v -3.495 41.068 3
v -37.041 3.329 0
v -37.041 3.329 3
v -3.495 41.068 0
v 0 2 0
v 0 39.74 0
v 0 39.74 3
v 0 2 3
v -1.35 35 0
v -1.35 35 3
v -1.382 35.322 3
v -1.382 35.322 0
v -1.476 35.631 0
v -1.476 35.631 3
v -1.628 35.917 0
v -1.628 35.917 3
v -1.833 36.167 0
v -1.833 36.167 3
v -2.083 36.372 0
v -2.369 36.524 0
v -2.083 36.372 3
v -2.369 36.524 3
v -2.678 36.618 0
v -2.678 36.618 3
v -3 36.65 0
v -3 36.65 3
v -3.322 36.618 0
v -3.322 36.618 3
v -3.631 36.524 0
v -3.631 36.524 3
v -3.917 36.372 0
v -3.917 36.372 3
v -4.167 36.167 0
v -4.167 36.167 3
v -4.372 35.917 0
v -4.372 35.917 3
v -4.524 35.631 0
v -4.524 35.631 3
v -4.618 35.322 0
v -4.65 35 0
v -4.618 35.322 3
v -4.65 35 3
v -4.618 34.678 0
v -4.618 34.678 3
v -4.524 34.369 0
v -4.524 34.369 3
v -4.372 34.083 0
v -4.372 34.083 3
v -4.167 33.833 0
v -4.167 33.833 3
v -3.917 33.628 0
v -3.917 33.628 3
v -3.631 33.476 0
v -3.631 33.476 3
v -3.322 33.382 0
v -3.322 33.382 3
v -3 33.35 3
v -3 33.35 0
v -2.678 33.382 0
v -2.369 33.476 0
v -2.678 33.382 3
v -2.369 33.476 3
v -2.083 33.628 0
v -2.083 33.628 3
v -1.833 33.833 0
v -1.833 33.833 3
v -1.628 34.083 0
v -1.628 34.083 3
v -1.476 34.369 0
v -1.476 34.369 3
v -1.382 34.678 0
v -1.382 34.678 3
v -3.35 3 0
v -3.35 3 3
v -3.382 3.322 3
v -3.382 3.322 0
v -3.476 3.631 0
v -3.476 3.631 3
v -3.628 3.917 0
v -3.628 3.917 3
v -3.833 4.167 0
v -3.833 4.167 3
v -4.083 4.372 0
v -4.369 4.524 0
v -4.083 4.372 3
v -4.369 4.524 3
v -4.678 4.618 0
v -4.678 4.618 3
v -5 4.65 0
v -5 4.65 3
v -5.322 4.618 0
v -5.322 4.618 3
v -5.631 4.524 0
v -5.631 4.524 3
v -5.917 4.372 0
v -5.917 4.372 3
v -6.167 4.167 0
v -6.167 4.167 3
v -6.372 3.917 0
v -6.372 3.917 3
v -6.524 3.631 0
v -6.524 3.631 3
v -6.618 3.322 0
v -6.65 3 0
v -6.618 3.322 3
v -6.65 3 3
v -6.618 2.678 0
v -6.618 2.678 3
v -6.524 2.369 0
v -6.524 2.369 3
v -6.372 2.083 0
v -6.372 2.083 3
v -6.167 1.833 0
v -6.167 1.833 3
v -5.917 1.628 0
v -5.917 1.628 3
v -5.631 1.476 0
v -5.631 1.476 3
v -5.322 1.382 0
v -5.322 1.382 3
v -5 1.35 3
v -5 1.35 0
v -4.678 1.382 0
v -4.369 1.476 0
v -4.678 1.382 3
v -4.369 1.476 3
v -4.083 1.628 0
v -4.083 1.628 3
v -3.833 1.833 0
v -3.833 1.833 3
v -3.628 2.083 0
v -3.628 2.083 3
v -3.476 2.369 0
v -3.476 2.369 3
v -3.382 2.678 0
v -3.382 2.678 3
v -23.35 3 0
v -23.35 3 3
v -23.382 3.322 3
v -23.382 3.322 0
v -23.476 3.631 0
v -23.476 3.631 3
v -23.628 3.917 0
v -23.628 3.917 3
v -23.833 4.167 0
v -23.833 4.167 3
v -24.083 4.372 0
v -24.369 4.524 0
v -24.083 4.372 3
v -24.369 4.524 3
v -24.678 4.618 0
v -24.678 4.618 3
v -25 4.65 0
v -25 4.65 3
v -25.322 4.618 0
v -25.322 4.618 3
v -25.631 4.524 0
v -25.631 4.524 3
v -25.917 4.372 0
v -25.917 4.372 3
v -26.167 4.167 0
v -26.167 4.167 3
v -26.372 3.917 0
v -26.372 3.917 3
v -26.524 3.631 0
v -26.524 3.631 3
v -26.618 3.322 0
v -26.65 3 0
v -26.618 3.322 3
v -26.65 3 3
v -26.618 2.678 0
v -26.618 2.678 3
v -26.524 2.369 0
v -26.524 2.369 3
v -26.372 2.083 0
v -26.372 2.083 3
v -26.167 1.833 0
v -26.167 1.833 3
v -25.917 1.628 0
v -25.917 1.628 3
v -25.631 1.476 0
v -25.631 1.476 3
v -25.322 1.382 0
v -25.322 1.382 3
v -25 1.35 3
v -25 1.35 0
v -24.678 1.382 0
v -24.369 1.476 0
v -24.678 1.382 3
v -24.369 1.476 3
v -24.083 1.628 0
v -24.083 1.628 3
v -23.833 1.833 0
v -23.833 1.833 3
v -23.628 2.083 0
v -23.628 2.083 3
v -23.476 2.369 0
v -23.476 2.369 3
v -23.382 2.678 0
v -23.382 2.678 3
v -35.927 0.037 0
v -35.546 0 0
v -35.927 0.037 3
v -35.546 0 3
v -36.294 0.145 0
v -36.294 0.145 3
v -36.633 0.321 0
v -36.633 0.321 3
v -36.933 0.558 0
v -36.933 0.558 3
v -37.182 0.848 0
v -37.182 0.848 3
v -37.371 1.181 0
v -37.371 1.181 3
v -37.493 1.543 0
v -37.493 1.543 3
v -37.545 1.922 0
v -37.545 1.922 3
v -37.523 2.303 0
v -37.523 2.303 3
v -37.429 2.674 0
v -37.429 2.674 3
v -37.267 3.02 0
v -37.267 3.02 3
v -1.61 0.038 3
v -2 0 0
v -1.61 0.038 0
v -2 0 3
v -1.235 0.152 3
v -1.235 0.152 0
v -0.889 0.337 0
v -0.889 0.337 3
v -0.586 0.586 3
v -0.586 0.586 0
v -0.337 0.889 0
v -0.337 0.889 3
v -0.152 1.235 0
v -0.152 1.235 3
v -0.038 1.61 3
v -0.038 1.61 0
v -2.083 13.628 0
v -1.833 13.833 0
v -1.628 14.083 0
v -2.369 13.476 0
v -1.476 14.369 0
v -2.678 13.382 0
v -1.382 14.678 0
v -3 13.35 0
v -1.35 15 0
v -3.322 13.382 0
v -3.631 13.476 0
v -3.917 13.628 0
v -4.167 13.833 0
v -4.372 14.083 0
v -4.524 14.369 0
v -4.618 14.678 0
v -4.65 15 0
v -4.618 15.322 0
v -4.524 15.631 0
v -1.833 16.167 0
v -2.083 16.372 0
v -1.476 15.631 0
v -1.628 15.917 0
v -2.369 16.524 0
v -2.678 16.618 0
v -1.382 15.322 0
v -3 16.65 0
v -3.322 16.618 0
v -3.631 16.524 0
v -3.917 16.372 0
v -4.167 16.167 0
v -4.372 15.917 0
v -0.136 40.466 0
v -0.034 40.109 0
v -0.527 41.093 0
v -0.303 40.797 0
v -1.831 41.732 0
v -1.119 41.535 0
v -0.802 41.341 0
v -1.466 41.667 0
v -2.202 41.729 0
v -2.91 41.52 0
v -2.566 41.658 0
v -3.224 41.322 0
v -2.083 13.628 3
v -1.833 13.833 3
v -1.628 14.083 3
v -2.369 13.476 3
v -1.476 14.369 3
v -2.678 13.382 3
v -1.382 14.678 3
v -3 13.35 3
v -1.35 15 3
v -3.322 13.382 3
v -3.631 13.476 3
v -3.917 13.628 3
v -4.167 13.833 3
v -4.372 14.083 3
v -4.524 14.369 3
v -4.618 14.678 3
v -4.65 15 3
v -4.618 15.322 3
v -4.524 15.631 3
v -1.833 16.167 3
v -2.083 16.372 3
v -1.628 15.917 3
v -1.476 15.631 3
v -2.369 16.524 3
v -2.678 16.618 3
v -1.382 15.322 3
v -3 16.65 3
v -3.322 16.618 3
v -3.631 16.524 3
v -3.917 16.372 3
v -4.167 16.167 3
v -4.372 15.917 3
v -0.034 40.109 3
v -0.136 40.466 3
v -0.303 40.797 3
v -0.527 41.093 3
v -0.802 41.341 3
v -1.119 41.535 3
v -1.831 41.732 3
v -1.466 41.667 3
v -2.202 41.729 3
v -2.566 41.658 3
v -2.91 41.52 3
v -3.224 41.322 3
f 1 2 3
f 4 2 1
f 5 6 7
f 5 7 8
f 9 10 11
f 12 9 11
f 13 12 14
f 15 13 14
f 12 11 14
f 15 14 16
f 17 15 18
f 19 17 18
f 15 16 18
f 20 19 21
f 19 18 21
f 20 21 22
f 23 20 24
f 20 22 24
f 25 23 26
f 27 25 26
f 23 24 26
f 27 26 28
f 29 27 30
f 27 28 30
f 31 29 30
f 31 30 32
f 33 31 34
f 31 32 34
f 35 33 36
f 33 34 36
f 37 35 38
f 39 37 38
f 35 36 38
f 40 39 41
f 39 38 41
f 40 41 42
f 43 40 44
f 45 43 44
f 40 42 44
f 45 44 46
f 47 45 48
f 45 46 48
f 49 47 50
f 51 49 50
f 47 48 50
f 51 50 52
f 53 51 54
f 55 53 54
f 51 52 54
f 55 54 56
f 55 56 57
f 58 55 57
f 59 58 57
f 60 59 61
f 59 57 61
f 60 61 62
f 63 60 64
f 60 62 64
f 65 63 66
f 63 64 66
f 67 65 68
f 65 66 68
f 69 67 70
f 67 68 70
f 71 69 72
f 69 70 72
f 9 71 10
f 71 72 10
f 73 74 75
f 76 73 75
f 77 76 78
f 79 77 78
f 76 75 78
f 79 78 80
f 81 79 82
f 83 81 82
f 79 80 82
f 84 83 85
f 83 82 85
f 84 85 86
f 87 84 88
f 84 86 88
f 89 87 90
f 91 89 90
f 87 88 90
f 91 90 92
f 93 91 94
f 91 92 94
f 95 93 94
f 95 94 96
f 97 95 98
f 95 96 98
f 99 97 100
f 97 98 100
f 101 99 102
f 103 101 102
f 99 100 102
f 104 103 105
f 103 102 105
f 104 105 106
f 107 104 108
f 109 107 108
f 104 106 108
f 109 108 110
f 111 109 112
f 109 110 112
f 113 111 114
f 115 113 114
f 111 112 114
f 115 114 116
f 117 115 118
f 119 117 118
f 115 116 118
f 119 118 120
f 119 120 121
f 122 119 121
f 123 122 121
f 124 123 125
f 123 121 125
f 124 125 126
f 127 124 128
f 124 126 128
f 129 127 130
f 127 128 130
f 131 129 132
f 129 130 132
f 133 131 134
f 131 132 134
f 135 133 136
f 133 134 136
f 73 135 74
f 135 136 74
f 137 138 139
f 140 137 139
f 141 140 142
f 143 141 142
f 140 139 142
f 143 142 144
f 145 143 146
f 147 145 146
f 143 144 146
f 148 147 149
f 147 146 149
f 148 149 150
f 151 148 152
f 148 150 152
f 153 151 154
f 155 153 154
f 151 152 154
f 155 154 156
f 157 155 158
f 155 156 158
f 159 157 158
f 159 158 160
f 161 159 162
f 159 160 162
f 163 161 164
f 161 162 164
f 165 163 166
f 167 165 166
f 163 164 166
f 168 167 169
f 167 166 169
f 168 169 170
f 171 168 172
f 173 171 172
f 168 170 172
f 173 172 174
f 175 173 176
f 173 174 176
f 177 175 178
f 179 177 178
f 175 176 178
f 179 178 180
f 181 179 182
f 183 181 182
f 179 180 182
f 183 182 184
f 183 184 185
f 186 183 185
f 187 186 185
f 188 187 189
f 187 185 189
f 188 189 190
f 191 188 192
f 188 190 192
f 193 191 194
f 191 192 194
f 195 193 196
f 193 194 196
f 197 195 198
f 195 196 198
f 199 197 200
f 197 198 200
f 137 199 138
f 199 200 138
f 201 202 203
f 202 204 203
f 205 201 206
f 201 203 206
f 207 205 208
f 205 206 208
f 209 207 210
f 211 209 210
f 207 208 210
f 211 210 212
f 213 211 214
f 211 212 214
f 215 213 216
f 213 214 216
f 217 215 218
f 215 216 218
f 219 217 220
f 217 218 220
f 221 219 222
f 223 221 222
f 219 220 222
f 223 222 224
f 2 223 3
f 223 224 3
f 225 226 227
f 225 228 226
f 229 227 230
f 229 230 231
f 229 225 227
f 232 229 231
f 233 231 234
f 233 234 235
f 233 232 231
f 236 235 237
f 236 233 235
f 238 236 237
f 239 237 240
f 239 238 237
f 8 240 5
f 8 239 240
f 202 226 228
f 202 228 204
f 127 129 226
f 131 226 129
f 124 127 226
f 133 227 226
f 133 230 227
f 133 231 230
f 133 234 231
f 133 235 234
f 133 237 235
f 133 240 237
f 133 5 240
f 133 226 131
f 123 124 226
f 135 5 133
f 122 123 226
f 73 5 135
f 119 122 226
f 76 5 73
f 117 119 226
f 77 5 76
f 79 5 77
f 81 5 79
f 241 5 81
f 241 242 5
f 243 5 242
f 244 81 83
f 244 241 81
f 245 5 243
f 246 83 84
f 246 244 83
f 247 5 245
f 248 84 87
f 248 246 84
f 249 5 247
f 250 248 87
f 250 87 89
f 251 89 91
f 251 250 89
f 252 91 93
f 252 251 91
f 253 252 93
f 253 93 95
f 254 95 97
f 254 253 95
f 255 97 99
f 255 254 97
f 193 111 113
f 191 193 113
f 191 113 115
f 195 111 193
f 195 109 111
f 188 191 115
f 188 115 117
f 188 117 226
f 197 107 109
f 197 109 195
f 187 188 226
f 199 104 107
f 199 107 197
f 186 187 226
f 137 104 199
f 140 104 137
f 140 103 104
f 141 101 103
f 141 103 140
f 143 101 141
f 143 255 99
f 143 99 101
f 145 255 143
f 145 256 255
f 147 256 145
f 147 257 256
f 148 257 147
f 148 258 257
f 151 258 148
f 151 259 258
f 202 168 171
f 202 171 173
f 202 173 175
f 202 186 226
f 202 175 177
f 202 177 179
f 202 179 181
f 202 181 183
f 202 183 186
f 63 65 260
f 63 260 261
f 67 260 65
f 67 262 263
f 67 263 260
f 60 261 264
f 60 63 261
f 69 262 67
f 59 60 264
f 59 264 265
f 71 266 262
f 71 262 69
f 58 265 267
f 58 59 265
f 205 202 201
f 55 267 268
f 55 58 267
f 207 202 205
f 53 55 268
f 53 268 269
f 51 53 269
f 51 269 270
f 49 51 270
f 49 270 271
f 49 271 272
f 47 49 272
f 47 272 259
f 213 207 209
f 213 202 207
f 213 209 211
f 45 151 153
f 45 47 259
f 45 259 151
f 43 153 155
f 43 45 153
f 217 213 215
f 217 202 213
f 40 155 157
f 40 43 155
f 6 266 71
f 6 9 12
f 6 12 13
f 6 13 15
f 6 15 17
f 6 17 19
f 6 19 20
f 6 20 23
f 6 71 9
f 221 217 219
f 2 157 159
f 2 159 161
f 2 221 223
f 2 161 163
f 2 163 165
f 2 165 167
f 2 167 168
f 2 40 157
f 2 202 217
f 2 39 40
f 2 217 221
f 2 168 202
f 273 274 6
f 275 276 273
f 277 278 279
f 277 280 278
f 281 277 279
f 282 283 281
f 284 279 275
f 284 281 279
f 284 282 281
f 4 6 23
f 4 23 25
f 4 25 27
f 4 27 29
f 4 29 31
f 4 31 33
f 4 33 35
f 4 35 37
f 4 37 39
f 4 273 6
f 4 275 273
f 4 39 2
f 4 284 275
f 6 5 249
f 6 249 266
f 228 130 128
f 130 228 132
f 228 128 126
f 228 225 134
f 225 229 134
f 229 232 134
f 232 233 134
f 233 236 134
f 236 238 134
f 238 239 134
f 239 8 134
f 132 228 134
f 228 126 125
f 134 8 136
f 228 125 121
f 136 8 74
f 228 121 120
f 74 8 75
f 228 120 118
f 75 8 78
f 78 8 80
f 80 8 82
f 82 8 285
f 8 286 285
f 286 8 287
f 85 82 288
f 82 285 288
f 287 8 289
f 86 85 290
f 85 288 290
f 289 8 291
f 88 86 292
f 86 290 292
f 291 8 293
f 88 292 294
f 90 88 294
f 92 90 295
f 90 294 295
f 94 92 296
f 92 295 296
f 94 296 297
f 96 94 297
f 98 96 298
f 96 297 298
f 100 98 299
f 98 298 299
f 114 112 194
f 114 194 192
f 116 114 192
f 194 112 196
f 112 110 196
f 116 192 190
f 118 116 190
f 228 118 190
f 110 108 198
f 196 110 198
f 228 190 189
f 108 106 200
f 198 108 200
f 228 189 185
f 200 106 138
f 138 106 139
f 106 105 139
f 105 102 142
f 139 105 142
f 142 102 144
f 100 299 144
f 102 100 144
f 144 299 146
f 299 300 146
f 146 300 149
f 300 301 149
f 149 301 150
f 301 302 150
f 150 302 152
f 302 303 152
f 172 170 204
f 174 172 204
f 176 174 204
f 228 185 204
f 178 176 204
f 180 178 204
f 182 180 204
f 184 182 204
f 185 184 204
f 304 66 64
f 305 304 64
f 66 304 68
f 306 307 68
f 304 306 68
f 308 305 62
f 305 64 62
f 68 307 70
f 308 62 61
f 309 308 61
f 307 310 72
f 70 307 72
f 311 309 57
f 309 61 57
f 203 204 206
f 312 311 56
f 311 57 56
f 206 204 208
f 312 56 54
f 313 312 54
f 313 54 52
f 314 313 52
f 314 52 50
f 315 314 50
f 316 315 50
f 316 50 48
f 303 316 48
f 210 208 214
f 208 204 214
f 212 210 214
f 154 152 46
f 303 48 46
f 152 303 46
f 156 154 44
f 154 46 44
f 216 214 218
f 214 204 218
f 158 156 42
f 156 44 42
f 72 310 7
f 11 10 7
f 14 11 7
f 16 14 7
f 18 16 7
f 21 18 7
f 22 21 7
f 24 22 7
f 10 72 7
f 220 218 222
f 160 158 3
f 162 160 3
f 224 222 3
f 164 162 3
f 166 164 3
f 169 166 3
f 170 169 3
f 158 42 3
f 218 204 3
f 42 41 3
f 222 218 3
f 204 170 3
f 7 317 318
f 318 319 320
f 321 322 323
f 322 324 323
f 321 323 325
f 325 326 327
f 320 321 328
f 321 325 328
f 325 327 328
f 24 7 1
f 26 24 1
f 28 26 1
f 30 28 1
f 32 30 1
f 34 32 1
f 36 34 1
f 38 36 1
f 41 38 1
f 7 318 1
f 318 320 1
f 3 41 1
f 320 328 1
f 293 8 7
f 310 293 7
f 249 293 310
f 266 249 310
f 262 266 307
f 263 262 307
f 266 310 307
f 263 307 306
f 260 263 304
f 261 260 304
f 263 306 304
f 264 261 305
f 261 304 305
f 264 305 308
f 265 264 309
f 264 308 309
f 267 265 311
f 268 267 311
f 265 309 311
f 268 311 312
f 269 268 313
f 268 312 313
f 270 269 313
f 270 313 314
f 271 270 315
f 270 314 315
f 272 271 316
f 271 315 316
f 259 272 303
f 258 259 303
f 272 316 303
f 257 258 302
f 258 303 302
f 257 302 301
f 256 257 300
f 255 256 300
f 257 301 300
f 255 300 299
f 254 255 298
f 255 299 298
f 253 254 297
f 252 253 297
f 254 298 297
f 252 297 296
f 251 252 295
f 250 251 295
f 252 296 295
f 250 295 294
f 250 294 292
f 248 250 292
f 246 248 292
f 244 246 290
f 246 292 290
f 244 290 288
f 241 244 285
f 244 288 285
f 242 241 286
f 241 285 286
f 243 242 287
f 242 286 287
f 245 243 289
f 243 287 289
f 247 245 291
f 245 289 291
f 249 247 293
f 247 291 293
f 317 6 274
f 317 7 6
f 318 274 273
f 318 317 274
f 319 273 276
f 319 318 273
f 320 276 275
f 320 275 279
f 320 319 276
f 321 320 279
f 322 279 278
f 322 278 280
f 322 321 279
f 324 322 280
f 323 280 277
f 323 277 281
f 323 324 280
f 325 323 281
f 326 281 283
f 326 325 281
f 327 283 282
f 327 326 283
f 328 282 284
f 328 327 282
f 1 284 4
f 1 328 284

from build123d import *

# Parameters (mm, degrees)
EXTRUDE_1_DEPTH     = 3
SKETCH_2_R          = 1.65
CUT_EXTRUDE_1_DEPTH = 3
SKETCH_3_R          = 1.65
CUT_EXTRUDE_2_DEPTH = 3
FILLET_1_R          = 2


with BuildPart() as part:
    # 草图1 → 凸台-拉伸1 (new body)
    with BuildSketch(Plane.XY):
        Polygon((0, 0), (-40, 0), (0, 45), align=None)
    extrude(amount=EXTRUDE_1_DEPTH)

    # 草图2 → 切除-拉伸1 (cut)
    with BuildSketch(Plane.XY.offset(3)):
        with Locations((-5, 3)):
            Circle(SKETCH_2_R)
        with Locations((-25, 3)):
            Circle(SKETCH_2_R)
    extrude(amount=-CUT_EXTRUDE_1_DEPTH, mode=Mode.SUBTRACT)

    # 草图3 → 切除-拉伸2 (cut)
    with BuildSketch(Plane.XY.offset(3)):
        with Locations((-3, 15)):
            Circle(SKETCH_3_R)
        with Locations((-3, 35)):
            Circle(SKETCH_3_R)
    extrude(amount=-CUT_EXTRUDE_2_DEPTH, mode=Mode.SUBTRACT)

    # 圆角1
    fillet_1_edges = [part.edges().sort_by_distance(p)[0] for p in [
        (0, 0, 1.5),
        (-40, 0, 1.5),
        (0, 45, 1.5),
    ]]
    fillet(fillet_1_edges, radius=FILLET_1_R)


solid = part.part
